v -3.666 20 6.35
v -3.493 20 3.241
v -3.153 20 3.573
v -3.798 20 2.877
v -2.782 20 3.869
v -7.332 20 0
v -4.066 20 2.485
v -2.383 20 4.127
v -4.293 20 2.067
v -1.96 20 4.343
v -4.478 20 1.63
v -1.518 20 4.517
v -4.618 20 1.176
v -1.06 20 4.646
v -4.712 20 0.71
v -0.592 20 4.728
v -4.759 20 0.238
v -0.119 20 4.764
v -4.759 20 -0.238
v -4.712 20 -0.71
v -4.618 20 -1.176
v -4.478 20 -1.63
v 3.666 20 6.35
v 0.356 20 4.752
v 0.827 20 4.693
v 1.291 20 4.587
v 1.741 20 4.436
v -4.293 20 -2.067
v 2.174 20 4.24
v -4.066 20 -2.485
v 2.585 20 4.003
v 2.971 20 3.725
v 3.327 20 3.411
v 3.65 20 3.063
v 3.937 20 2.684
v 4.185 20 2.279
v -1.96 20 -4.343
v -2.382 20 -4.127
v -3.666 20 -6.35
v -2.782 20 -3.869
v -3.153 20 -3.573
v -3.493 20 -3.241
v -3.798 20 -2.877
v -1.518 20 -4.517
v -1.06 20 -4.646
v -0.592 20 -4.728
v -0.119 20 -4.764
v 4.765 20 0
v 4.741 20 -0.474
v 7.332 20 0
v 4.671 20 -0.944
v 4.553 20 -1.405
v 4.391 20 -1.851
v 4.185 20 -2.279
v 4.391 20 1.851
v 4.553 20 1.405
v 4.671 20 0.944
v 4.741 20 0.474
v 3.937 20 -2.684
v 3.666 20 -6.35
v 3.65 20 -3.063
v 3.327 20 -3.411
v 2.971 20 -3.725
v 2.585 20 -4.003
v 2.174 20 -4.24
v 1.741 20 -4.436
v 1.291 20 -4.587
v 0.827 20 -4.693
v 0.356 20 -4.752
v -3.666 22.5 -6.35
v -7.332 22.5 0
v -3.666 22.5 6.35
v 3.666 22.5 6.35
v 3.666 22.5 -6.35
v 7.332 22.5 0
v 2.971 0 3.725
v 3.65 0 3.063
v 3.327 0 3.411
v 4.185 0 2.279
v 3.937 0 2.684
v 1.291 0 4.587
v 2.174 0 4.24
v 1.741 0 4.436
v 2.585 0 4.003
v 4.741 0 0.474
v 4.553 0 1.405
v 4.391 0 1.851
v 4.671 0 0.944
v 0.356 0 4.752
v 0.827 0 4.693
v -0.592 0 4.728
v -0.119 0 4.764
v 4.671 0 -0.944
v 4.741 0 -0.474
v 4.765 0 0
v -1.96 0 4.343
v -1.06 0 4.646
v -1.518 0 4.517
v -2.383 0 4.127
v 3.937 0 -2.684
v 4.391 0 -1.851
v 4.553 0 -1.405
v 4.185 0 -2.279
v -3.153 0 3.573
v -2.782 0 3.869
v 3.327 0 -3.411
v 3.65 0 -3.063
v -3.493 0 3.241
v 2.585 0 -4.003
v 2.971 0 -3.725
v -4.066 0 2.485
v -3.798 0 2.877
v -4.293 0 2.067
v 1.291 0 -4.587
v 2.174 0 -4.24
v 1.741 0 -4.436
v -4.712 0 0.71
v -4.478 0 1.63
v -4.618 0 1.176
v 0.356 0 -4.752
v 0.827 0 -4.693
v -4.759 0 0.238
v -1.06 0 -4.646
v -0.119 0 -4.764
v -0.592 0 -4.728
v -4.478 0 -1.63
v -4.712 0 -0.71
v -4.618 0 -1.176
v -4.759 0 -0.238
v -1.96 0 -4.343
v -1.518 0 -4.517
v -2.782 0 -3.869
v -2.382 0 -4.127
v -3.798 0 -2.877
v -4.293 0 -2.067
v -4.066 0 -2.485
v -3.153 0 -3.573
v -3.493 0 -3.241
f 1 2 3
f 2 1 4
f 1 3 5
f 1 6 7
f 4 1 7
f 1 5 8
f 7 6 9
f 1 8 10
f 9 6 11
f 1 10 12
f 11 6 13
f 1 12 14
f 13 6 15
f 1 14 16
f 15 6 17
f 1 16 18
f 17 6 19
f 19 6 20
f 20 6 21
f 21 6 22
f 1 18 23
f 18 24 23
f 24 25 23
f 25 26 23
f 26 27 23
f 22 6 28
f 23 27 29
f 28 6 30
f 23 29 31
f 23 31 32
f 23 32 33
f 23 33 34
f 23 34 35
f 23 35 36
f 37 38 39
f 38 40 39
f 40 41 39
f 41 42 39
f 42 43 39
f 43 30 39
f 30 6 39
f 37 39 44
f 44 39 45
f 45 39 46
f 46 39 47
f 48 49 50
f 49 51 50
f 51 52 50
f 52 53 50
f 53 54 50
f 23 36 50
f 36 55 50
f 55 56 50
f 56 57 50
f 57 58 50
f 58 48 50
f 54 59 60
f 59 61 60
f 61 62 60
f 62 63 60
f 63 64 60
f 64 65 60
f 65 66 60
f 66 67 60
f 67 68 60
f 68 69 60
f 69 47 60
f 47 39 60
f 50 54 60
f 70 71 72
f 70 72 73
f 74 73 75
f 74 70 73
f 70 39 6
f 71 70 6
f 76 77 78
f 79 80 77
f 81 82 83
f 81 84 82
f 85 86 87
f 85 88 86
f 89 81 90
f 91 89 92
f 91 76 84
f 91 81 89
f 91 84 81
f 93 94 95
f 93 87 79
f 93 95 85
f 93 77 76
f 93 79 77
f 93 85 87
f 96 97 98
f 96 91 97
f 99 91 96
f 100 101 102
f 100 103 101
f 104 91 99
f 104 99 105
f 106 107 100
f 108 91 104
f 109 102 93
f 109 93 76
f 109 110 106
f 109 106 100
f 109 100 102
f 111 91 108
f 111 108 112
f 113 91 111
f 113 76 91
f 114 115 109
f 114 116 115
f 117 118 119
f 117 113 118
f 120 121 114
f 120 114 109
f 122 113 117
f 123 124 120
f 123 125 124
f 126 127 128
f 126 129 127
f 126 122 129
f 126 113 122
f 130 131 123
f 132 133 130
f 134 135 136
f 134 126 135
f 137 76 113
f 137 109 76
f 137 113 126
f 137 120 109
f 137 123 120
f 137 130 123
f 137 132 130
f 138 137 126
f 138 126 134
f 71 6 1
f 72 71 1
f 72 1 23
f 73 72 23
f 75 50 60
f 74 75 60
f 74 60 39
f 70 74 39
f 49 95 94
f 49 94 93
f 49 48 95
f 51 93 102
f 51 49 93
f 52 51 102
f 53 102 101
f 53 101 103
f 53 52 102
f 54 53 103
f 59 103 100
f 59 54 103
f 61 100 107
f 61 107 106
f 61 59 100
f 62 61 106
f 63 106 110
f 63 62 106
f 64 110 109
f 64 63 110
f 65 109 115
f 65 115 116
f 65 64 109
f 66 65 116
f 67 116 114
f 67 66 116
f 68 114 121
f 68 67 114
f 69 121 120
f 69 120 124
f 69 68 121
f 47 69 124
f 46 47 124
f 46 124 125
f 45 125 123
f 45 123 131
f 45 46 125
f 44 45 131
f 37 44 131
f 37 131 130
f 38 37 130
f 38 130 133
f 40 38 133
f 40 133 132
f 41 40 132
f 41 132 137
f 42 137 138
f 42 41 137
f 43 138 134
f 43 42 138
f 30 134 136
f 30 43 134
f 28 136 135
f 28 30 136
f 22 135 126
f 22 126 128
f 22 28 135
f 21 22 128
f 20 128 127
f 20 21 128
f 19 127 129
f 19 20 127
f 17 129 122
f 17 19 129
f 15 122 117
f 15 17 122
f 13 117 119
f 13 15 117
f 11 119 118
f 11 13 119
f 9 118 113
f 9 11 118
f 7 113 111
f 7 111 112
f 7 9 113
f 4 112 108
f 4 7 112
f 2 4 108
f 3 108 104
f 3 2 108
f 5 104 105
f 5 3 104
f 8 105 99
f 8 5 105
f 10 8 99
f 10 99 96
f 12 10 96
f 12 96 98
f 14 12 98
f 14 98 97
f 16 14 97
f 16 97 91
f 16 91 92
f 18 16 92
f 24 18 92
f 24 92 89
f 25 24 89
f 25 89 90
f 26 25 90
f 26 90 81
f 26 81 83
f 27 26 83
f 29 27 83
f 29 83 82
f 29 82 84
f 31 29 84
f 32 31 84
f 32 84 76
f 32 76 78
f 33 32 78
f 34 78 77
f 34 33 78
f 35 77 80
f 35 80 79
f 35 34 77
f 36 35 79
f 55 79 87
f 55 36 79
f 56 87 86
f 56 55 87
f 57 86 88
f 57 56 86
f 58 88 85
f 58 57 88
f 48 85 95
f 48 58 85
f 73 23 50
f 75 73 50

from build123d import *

# Parameters (mm, degrees)
CROQUIS1_W              = 4.765
CROQUIS1_H              = 20
SALIENTE_EXTRUIR1_DEPTH = 2.5


with BuildPart() as part:
    # Croquis1 → Revolución1 (revolve)
    with BuildSketch(Plane.XY):
        with Locations((2.3825, 10)):
            Rectangle(CROQUIS1_W, CROQUIS1_H)
    revolve(axis=Axis((0, 0, 0), (0, 1, 0)))

    # Croquis2 → Saliente-Extruir1 (add)
    with BuildSketch(Plane(origin=(0, 20, 0), x_dir=(1, 0, 0), z_dir=(0, 1, 0))):
        Polygon((-7.332348419, 0), (-3.666174209, -6.35), (3.666174209, -6.35), (7.332348419, 0), (3.666174209, 6.35), (-3.666174209, 6.35), align=None)
    extrude(amount=SALIENTE_EXTRUIR1_DEPTH)


solid = part.part
